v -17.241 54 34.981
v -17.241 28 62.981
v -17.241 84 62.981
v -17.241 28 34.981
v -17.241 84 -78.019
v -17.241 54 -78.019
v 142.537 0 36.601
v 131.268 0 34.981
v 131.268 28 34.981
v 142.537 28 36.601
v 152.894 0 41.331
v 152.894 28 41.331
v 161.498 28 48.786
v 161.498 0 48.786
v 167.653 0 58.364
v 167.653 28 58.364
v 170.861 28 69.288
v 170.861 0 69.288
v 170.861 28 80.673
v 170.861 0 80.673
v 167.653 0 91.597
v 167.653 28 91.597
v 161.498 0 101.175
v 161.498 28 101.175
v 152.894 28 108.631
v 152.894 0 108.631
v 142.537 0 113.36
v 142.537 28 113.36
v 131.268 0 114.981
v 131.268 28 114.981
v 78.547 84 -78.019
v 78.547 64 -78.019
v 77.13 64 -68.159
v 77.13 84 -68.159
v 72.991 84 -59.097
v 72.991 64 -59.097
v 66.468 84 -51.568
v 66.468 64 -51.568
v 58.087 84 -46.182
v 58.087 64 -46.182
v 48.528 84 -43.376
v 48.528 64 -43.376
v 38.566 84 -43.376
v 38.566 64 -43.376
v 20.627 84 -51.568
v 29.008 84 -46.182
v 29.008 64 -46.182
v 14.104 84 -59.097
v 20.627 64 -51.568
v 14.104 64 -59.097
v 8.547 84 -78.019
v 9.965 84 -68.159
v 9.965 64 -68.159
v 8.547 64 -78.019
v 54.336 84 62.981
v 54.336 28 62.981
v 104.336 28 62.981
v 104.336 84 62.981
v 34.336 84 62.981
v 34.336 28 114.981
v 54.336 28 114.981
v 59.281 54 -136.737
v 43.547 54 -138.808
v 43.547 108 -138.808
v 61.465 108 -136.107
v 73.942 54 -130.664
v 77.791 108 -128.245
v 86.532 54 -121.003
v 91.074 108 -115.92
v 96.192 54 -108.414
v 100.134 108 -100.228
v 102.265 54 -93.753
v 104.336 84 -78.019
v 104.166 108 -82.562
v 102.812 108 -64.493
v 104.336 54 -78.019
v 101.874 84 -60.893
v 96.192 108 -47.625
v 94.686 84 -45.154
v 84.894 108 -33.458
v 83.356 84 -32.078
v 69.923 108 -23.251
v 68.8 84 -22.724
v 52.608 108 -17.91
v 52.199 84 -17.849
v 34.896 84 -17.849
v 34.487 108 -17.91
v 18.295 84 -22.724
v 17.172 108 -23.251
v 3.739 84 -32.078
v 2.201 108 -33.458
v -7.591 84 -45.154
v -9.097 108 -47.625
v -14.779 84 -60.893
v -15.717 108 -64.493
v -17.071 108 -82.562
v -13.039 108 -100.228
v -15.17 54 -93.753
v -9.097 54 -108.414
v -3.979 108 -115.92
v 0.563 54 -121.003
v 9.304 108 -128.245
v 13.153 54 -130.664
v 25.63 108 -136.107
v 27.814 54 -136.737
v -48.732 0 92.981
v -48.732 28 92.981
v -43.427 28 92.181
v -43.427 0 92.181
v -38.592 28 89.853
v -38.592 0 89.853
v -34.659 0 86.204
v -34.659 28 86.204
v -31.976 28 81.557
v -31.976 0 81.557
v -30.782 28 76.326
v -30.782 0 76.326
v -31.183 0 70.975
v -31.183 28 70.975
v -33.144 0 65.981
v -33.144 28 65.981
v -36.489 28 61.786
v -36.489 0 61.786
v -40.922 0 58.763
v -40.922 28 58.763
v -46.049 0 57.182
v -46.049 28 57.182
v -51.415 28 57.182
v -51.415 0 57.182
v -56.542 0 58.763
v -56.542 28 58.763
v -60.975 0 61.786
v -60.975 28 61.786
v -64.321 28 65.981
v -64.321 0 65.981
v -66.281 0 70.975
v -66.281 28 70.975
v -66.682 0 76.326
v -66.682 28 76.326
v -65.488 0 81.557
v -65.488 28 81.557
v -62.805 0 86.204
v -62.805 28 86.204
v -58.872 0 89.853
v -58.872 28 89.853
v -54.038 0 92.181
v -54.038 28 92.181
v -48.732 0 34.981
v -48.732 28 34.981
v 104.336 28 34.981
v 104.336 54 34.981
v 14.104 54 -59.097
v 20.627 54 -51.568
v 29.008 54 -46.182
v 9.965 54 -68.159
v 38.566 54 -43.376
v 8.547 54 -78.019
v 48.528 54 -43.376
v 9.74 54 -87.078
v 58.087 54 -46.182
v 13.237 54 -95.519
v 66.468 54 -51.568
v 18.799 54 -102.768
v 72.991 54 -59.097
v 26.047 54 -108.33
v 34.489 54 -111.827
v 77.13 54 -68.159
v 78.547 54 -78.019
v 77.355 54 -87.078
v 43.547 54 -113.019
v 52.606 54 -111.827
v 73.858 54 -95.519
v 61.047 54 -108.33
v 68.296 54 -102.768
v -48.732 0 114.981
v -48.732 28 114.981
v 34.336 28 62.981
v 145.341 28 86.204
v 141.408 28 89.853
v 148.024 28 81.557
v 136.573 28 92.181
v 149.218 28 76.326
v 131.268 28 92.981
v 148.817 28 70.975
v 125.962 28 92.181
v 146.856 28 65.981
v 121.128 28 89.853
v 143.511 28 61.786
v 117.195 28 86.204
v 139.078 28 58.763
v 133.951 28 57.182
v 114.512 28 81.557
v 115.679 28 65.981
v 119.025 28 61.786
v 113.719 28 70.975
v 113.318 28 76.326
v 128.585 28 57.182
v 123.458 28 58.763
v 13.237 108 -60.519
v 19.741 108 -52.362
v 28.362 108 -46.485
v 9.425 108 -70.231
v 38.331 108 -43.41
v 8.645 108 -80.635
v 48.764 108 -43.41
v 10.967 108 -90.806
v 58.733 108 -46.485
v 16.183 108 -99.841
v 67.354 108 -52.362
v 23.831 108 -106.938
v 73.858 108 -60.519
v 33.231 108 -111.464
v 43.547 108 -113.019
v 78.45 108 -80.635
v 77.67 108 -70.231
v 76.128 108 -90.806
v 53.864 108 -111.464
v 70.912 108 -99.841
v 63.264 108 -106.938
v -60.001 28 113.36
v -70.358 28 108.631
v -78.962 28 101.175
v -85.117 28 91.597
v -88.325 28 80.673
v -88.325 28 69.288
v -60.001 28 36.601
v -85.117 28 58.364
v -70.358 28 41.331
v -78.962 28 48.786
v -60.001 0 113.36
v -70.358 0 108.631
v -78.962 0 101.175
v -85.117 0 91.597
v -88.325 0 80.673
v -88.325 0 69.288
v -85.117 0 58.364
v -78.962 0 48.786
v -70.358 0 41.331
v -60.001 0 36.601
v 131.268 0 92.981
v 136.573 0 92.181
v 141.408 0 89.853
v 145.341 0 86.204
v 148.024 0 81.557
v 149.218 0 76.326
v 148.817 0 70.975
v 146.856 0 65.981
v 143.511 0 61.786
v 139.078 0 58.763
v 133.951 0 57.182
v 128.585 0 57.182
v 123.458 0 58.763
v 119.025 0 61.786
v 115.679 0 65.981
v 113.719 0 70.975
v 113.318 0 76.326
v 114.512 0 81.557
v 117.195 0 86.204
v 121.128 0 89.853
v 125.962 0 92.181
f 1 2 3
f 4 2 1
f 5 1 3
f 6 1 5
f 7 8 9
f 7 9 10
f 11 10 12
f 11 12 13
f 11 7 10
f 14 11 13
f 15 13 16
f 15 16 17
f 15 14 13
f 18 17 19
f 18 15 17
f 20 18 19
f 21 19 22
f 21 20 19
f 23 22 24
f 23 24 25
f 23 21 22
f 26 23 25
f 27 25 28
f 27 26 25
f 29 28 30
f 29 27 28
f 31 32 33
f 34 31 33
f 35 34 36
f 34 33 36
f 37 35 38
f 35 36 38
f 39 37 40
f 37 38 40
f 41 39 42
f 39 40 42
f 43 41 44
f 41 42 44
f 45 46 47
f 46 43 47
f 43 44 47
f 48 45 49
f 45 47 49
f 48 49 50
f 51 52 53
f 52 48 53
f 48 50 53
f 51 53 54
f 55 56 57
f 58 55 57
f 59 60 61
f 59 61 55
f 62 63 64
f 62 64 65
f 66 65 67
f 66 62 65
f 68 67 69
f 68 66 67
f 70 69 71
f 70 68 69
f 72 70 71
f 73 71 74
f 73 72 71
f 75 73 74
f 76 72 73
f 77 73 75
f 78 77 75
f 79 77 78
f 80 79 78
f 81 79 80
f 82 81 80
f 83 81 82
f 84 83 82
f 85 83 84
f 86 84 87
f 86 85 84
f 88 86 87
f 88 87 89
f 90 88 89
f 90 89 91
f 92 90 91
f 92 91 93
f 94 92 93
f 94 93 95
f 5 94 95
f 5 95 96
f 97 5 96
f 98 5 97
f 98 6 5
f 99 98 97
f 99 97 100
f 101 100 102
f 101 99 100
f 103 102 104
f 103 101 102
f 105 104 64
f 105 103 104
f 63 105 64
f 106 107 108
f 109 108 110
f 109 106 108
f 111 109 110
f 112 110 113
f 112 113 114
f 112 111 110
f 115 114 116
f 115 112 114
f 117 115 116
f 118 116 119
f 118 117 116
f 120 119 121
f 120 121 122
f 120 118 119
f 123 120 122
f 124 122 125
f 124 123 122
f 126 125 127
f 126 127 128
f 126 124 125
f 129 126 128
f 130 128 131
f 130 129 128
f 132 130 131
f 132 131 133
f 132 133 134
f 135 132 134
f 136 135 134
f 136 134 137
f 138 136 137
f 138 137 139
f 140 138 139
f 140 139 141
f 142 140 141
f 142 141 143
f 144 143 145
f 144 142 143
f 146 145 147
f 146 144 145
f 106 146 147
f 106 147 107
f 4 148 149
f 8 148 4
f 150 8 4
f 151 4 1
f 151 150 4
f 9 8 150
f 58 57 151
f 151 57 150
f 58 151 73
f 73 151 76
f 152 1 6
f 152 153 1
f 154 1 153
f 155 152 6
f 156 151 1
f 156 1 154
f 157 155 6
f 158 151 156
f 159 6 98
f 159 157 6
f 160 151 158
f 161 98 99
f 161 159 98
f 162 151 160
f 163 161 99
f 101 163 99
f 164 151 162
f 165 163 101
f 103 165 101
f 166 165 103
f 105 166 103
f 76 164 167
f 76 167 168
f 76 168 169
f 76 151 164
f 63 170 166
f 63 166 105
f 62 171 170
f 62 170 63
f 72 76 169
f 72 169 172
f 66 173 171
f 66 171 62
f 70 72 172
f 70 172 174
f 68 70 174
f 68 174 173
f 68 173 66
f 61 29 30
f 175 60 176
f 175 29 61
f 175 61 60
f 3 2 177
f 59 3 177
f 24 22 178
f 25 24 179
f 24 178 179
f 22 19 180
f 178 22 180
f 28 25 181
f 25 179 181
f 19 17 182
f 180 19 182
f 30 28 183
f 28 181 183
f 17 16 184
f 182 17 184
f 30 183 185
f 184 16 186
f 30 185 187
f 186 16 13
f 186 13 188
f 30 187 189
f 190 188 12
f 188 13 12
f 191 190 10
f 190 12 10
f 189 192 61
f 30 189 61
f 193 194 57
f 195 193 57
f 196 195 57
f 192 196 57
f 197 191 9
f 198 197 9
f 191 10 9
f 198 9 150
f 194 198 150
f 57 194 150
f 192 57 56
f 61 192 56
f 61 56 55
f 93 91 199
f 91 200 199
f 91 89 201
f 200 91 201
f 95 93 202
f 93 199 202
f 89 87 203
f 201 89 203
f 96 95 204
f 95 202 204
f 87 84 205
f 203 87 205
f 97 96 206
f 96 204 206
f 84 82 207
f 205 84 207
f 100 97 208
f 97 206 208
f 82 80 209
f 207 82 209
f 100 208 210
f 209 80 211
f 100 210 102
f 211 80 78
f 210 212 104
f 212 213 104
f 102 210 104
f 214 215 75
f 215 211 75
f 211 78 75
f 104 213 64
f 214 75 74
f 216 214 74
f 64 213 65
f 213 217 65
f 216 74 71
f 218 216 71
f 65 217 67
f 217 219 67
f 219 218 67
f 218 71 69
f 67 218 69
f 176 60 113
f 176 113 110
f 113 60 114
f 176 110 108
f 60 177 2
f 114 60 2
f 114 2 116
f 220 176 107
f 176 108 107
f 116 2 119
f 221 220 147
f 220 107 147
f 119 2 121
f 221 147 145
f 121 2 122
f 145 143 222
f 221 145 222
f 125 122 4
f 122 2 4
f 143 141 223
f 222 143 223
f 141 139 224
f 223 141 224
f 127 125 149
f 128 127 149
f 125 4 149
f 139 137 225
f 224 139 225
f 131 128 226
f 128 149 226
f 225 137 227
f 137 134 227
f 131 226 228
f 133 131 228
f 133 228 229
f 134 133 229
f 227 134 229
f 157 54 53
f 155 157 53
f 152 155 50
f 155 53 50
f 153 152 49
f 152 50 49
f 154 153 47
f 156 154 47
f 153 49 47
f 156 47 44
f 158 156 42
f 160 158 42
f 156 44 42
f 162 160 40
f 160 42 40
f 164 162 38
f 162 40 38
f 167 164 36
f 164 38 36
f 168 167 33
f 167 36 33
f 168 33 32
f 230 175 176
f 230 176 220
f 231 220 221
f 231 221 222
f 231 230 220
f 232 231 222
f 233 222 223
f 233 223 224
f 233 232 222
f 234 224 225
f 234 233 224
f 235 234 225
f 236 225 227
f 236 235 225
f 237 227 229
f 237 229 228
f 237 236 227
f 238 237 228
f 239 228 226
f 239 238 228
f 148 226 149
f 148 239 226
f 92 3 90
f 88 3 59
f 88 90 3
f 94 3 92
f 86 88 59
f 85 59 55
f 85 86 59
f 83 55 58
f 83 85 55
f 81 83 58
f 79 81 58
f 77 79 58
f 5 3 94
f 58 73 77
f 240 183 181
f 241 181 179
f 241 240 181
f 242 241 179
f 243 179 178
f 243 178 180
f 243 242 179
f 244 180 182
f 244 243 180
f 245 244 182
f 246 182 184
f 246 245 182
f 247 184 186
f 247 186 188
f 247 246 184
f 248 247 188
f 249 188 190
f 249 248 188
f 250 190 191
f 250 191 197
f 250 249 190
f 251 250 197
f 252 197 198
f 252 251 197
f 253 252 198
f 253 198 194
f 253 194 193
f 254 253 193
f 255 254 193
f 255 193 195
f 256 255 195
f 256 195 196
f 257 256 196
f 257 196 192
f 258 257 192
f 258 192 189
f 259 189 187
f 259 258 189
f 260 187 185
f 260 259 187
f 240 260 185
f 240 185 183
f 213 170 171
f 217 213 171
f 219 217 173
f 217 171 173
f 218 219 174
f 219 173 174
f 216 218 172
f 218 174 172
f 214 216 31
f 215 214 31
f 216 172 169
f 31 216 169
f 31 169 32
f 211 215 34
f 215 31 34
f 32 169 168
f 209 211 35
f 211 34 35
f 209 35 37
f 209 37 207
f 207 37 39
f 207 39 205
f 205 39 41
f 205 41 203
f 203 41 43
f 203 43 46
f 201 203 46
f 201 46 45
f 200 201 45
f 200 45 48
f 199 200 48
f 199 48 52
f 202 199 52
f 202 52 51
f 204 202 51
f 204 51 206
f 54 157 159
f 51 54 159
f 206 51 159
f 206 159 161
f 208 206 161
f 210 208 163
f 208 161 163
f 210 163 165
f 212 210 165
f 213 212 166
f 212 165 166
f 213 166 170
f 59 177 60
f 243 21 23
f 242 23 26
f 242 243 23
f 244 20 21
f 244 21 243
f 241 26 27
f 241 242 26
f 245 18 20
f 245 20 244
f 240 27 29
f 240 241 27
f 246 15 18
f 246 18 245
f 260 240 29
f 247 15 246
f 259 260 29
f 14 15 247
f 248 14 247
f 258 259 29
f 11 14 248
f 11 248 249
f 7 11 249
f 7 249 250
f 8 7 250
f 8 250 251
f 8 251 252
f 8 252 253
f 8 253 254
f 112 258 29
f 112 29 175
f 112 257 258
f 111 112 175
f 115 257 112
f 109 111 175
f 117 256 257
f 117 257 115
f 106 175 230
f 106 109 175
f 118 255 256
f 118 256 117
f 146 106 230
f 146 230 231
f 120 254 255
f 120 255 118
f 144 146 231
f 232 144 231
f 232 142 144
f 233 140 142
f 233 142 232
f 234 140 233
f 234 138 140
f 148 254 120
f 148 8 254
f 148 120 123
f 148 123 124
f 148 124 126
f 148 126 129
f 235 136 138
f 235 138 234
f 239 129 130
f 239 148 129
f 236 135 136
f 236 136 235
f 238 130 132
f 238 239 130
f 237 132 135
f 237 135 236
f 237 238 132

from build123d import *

# Parameters (mm, degrees)
SKETCH_1_R          = 18
EXTRUDE_1_DEPTH     = 28
SKETCH_2_W          = 121.577423065
SKETCH_2_H          = 141
EXTRUDE_2_DEPTH     = 56
SKETCH_5_W          = 113
SKETCH_5_H          = 26
CUT_EXTRUDE_1_DEPTH = 180
SKETCH_7_R          = 60.788711533
SKETCH_7_R_2        = 35
EXTRUDE_4_DEPTH     = 54
EXTRUDE_START       = -70
EXTRUDE_5_DEPTH     = 20
CUT_EXTRUDE_START   = -20
SKETCH_9_R          = 35
CUT_EXTRUDE_2_DEPTH = 20
CUT_EXTRUDE_5_DEPTH = 236.915979109


with BuildPart() as part:
    # 스케치1 → 보스-돌출1 (new body)
    with BuildSketch(Plane(origin=(0, 0, 0), x_dir=(1, 0, 0), z_dir=(0, 1, 0))):
        with BuildLine():
            Line((-48.732108463, -34.980719949), (131.267891537, -34.980719949))
            ThreePointArc((131.267891537, -34.980719949), (171.267891537, -74.980719949), (131.267891537, -114.980719949))
            Line((131.267891537, -114.980719949), (-48.732108463, -114.980719949))
            ThreePointArc((-48.732108463, -114.980719949), (-88.732108463, -74.980719949), (-48.732108463, -34.980719949))
        make_face()
        with Locations(Location((-48.732108463, -74.980719949, 0), (0, 0, 270))):
            Circle(SKETCH_1_R, mode=Mode.SUBTRACT)
        with Locations(Location((131.267891537, -74.980719949, 0), (0, 0, 270))):
            Circle(SKETCH_1_R, mode=Mode.SUBTRACT)
    extrude(amount=EXTRUDE_1_DEPTH)

    # 스케치2 → 보스-돌출2 (add)
    with BuildSketch(Plane(origin=(0, 28, 0), x_dir=(1, 0, 0), z_dir=(0, 1, 0))):
        with Locations((43.54746822, 7.519280051)):
            Rectangle(SKETCH_2_W, SKETCH_2_H)
    extrude(amount=EXTRUDE_2_DEPTH)

    # 스케치5 → 컷-돌출1 (cut)
    with BuildSketch(Plane(origin=(104.336179752, 0, 0), x_dir=(0, 0, -1), z_dir=(1, 0, 0))):
        with Locations((21.519280051, 41)):
            Rectangle(SKETCH_5_W, SKETCH_5_H)
    extrude(amount=-CUT_EXTRUDE_1_DEPTH, mode=Mode.SUBTRACT)

    # 스케치7 → 보스-돌출4 (add)
    with BuildSketch(Plane.XZ.offset(-54)):
        with Locations(Location((43.54746822, -78.019280051, 0), (0, 0, 270))):
            Circle(SKETCH_7_R)
        with Locations(Location((43.54746822, -78.019280051, 0), (0, 0, 270))):
            Circle(SKETCH_7_R_2, mode=Mode.SUBTRACT)
    extrude(amount=-EXTRUDE_4_DEPTH)

    # 스케치8 → 보스-돌출5 (add)
    with BuildSketch(Plane(origin=(104.336179752, 0, 0), x_dir=(0, 0, -1), z_dir=(1, 0, 0)).offset(EXTRUDE_START)):
        Polygon((-114.980719949, 28), (-62.980719949, 84), (-62.980719949, 28), align=None)
    extrude(amount=EXTRUDE_5_DEPTH)

    # 스케치9 → 컷-돌출2 (cut)
    with BuildSketch(Plane(origin=(0, 84, 0), x_dir=(1, 0, 0), z_dir=(0, 1, 0)).offset(CUT_EXTRUDE_START)):
        with Locations(Location((43.54746822, 78.019280051, 0), (0, 0, 90))):
            Circle(SKETCH_9_R)
    extrude(amount=CUT_EXTRUDE_2_DEPTH, mode=Mode.SUBTRACT)

    # 스케치11 → 컷-돌출5 (cut, through all)
    with BuildSketch(Plane(origin=(0, 84, 0), x_dir=(1, 0, 0), z_dir=(0, 1, 0))):
        with BuildLine():
            Line((78.54746822, 78.019280051), (8.54746822, 78.019280051))
            ThreePointArc((8.54746822, 78.019280051), (43.54746822, 43.019280051), (78.54746822, 78.019280051))
        make_face()
    extrude(amount=-CUT_EXTRUDE_5_DEPTH, mode=Mode.SUBTRACT)


solid = part.part
